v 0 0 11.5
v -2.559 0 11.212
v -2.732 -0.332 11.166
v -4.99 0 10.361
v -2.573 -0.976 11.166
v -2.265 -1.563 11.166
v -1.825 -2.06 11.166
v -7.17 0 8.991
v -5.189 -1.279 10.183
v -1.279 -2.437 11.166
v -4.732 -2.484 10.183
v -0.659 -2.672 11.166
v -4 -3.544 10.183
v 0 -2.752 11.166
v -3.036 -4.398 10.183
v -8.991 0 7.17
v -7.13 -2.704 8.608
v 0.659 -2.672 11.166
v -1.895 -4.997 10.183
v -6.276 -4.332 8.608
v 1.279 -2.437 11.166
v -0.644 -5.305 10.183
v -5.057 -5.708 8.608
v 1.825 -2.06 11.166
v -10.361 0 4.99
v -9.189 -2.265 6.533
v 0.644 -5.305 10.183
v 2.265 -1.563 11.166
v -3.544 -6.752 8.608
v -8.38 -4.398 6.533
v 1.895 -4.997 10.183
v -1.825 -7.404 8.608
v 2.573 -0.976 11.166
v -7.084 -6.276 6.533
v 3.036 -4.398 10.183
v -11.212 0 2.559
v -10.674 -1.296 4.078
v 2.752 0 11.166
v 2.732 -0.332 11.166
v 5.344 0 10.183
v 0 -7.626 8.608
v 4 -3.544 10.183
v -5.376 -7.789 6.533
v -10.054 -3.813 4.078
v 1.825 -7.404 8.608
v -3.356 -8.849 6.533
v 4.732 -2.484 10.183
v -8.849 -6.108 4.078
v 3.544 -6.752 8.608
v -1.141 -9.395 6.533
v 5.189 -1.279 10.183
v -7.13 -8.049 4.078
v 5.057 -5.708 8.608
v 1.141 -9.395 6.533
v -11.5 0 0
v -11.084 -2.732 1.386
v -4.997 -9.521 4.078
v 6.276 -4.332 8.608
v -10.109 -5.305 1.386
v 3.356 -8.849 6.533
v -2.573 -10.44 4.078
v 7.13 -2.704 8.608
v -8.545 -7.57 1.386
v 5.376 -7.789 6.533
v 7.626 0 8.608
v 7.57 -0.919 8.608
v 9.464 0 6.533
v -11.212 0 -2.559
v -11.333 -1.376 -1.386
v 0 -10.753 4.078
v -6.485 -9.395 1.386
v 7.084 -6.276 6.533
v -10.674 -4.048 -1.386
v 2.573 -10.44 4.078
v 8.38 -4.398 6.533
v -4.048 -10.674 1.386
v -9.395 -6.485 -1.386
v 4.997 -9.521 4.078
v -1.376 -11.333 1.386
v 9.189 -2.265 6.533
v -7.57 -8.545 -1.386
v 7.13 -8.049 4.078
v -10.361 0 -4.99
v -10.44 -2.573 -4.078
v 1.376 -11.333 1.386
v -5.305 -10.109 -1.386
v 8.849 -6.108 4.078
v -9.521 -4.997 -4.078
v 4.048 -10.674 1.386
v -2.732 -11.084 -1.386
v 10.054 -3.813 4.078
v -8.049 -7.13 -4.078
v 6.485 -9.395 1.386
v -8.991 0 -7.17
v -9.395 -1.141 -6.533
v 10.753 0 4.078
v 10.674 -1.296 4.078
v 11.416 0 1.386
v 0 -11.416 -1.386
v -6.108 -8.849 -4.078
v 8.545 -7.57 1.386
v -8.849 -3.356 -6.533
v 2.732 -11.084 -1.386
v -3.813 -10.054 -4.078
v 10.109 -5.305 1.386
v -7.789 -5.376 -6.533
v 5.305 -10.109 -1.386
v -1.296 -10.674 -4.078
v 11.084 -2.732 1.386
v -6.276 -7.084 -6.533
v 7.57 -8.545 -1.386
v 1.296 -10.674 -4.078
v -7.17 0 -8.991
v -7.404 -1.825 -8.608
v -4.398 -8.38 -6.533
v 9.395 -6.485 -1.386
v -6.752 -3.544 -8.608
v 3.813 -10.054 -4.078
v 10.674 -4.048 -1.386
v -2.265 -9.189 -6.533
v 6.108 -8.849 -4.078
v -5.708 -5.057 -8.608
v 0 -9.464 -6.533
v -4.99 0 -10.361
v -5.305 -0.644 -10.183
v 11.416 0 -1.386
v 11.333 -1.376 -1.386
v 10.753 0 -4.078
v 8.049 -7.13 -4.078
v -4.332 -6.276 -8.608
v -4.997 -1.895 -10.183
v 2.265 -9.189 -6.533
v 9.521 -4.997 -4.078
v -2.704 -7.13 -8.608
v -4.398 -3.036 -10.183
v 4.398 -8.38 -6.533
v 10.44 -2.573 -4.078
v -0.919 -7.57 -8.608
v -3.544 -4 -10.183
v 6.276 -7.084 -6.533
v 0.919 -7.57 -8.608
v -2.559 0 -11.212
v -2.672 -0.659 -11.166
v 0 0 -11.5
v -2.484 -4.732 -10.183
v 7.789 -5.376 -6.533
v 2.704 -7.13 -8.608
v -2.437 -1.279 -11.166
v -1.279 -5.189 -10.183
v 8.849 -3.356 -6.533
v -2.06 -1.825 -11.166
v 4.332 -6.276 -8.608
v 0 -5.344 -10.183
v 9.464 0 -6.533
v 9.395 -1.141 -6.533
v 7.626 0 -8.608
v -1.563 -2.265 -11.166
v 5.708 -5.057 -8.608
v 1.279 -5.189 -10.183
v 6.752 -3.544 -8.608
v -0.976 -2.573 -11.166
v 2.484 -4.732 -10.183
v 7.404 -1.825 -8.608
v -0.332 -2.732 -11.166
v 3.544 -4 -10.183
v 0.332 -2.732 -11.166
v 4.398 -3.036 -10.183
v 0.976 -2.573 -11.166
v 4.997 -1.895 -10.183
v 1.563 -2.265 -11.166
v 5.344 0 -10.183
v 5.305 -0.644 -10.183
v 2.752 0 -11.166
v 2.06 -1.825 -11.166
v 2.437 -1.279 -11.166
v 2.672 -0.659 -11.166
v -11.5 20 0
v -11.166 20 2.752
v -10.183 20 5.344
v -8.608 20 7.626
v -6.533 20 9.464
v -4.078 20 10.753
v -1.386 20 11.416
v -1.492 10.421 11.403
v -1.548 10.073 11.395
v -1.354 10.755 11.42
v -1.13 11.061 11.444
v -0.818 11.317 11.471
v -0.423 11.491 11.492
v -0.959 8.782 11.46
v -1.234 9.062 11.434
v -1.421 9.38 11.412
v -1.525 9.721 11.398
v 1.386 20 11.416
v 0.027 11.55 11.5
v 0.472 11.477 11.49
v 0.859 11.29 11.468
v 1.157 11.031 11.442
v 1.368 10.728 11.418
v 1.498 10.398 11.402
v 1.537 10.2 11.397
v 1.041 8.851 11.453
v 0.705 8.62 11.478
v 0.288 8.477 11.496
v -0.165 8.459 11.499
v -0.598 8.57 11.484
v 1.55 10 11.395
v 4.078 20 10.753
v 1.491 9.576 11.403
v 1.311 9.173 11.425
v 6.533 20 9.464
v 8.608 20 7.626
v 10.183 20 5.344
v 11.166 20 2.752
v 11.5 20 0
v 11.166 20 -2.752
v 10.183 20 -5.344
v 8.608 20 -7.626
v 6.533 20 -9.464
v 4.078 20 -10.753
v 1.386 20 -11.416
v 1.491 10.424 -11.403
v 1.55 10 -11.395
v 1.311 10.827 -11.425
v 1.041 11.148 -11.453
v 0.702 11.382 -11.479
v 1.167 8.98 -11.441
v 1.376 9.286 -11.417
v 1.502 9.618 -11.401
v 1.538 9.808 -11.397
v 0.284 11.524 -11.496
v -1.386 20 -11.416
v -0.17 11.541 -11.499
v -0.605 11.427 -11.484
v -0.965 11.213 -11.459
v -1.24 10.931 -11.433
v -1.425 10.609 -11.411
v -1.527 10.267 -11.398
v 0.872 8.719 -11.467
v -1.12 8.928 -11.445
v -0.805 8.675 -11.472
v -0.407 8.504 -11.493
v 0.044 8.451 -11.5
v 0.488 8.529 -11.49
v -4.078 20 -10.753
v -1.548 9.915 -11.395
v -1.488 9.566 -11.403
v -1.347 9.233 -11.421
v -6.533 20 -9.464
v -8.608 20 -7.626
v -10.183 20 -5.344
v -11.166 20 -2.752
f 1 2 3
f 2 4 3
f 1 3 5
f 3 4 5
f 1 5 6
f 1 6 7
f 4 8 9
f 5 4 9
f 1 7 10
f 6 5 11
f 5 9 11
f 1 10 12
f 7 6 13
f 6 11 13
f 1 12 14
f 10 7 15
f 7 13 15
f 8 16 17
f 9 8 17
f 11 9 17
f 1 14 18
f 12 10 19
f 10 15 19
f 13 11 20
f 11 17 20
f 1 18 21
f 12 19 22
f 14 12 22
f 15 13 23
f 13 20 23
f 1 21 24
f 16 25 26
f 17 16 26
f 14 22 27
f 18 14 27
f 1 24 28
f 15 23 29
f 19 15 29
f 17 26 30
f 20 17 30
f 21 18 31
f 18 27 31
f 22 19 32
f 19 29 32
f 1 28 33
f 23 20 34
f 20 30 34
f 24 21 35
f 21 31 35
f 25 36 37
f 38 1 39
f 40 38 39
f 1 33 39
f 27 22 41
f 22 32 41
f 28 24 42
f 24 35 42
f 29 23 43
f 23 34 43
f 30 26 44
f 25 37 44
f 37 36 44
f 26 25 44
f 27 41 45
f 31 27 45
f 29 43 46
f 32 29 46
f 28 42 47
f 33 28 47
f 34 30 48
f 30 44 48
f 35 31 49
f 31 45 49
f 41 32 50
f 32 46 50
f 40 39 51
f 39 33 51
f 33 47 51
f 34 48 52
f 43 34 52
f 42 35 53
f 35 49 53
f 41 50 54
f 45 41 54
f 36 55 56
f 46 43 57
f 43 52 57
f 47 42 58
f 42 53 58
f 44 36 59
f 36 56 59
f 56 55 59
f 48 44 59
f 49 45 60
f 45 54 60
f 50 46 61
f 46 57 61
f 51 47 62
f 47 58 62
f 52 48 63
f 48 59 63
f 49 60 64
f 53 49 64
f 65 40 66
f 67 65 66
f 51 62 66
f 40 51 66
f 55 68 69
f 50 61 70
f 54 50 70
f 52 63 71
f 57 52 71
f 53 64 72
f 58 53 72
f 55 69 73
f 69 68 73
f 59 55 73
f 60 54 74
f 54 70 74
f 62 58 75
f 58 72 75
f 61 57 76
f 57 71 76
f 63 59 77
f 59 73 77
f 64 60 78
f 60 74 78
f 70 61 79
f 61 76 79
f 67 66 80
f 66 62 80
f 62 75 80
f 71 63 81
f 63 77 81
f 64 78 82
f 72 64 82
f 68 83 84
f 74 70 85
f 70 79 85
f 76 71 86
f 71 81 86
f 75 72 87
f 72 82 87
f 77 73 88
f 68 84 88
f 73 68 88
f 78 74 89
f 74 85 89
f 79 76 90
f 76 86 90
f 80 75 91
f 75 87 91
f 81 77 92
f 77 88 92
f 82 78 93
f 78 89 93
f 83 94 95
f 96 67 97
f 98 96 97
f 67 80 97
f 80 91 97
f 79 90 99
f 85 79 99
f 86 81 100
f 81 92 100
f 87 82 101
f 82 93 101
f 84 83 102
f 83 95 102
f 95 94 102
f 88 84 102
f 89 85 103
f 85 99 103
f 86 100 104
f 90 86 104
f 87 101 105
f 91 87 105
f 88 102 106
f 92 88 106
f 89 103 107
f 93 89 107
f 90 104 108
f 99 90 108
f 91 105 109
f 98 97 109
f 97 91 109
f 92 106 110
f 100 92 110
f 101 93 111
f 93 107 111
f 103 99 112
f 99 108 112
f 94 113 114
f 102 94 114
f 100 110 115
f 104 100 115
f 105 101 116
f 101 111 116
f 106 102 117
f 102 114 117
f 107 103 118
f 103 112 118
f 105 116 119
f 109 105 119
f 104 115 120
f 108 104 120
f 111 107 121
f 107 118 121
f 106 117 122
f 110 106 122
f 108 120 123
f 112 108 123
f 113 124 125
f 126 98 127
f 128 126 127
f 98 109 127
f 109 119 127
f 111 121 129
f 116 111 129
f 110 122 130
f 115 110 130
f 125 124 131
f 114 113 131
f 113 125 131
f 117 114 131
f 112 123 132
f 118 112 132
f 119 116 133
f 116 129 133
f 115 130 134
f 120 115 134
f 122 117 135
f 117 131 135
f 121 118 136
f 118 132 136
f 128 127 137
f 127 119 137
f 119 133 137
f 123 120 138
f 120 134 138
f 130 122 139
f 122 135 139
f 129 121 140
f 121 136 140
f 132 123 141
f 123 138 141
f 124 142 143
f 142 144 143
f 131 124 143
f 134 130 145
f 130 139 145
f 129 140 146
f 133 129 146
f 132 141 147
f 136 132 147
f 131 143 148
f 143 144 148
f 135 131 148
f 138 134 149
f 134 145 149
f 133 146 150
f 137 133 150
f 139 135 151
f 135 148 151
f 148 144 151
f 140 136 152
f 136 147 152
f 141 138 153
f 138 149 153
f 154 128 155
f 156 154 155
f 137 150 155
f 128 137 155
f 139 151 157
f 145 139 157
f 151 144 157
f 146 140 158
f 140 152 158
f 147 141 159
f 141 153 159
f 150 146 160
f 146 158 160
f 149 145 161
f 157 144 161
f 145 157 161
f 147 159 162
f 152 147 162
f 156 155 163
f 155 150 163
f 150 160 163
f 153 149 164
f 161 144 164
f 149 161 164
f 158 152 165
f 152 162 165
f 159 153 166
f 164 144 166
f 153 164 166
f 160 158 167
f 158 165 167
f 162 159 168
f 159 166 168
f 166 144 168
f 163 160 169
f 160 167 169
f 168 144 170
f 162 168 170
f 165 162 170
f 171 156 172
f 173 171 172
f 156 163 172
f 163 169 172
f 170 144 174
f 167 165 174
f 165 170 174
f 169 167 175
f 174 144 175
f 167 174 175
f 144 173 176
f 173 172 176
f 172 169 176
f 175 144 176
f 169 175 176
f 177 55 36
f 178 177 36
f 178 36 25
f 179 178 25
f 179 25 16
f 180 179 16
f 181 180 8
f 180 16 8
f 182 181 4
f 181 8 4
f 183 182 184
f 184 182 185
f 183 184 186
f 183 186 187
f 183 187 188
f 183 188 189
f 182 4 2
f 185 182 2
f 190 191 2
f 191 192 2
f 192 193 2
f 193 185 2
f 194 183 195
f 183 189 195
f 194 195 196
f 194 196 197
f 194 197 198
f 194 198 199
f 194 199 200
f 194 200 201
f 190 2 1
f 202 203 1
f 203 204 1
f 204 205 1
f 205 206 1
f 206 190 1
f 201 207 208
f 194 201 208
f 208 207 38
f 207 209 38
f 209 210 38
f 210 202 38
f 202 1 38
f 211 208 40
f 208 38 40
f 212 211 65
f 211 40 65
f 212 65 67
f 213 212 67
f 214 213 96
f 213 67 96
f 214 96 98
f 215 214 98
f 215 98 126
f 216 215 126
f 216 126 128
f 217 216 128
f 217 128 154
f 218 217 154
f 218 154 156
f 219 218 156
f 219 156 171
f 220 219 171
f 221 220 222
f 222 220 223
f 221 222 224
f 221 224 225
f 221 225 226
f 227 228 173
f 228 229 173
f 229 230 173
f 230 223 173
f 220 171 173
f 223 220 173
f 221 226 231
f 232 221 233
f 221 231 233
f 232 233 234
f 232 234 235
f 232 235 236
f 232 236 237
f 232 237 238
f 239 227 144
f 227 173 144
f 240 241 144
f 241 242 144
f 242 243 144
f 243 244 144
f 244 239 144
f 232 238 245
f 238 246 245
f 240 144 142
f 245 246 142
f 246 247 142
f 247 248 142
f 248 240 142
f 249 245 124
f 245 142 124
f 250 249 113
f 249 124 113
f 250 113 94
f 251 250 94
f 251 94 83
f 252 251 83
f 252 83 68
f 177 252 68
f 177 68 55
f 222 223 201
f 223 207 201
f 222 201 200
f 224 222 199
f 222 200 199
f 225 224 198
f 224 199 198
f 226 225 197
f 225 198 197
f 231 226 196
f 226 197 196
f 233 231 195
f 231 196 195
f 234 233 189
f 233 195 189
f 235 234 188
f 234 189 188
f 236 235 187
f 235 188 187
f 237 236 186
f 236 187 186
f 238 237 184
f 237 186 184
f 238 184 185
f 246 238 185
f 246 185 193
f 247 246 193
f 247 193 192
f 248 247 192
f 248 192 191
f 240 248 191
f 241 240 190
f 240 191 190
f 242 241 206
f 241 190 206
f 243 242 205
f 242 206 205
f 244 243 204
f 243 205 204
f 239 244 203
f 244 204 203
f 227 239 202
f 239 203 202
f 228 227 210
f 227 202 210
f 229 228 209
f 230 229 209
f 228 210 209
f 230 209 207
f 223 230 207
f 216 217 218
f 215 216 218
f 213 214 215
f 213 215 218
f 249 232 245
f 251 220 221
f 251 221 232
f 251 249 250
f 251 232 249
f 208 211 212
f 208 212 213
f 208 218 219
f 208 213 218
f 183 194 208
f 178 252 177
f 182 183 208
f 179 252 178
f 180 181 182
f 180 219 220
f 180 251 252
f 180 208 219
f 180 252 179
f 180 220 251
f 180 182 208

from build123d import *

# Parameters (mm, degrees)
REVOLVE1_ANGLE      = 180
SKETCH4_R           = 11.5
BOSS_EXTRUDE1_DEPTH = 20
SKETCH5_R           = 1.55
CUT_EXTRUDE1_DEPTH  = 11.5


with BuildPart() as part:
    # Sketch1 → Revolve1 (revolve)
    with BuildSketch(Plane(origin=(0, 0, 0), x_dir=(1, 0, 0), z_dir=(0, 1, 0))):
        with BuildLine():
            Line((0, 11.5), (0, -11.5))
            ThreePointArc((0, -11.5), (-11.5, 0), (0, 11.5))
        make_face()
    revolve(axis=Axis((0, 0, -22.021429017), (0, 0, 1)), revolution_arc=REVOLVE1_ANGLE)

    # Sketch4 → Boss-Extrude1 (add)
    with BuildSketch(Plane(origin=(0, 0, 0), x_dir=(1, 0, 0), z_dir=(0, 1, 0))):
        with Locations(Location((0, 0, 0), (0, 0, 180))):
            Circle(SKETCH4_R)
    extrude(amount=BOSS_EXTRUDE1_DEPTH)

    # Sketch5 → Cut-Extrude1 (cut, symmetric)
    with BuildSketch(Plane.XY):
        with Locations((0, 10)):
            Circle(SKETCH5_R)
    extrude(amount=CUT_EXTRUDE1_DEPTH, both=True, mode=Mode.SUBTRACT)


solid = part.part
